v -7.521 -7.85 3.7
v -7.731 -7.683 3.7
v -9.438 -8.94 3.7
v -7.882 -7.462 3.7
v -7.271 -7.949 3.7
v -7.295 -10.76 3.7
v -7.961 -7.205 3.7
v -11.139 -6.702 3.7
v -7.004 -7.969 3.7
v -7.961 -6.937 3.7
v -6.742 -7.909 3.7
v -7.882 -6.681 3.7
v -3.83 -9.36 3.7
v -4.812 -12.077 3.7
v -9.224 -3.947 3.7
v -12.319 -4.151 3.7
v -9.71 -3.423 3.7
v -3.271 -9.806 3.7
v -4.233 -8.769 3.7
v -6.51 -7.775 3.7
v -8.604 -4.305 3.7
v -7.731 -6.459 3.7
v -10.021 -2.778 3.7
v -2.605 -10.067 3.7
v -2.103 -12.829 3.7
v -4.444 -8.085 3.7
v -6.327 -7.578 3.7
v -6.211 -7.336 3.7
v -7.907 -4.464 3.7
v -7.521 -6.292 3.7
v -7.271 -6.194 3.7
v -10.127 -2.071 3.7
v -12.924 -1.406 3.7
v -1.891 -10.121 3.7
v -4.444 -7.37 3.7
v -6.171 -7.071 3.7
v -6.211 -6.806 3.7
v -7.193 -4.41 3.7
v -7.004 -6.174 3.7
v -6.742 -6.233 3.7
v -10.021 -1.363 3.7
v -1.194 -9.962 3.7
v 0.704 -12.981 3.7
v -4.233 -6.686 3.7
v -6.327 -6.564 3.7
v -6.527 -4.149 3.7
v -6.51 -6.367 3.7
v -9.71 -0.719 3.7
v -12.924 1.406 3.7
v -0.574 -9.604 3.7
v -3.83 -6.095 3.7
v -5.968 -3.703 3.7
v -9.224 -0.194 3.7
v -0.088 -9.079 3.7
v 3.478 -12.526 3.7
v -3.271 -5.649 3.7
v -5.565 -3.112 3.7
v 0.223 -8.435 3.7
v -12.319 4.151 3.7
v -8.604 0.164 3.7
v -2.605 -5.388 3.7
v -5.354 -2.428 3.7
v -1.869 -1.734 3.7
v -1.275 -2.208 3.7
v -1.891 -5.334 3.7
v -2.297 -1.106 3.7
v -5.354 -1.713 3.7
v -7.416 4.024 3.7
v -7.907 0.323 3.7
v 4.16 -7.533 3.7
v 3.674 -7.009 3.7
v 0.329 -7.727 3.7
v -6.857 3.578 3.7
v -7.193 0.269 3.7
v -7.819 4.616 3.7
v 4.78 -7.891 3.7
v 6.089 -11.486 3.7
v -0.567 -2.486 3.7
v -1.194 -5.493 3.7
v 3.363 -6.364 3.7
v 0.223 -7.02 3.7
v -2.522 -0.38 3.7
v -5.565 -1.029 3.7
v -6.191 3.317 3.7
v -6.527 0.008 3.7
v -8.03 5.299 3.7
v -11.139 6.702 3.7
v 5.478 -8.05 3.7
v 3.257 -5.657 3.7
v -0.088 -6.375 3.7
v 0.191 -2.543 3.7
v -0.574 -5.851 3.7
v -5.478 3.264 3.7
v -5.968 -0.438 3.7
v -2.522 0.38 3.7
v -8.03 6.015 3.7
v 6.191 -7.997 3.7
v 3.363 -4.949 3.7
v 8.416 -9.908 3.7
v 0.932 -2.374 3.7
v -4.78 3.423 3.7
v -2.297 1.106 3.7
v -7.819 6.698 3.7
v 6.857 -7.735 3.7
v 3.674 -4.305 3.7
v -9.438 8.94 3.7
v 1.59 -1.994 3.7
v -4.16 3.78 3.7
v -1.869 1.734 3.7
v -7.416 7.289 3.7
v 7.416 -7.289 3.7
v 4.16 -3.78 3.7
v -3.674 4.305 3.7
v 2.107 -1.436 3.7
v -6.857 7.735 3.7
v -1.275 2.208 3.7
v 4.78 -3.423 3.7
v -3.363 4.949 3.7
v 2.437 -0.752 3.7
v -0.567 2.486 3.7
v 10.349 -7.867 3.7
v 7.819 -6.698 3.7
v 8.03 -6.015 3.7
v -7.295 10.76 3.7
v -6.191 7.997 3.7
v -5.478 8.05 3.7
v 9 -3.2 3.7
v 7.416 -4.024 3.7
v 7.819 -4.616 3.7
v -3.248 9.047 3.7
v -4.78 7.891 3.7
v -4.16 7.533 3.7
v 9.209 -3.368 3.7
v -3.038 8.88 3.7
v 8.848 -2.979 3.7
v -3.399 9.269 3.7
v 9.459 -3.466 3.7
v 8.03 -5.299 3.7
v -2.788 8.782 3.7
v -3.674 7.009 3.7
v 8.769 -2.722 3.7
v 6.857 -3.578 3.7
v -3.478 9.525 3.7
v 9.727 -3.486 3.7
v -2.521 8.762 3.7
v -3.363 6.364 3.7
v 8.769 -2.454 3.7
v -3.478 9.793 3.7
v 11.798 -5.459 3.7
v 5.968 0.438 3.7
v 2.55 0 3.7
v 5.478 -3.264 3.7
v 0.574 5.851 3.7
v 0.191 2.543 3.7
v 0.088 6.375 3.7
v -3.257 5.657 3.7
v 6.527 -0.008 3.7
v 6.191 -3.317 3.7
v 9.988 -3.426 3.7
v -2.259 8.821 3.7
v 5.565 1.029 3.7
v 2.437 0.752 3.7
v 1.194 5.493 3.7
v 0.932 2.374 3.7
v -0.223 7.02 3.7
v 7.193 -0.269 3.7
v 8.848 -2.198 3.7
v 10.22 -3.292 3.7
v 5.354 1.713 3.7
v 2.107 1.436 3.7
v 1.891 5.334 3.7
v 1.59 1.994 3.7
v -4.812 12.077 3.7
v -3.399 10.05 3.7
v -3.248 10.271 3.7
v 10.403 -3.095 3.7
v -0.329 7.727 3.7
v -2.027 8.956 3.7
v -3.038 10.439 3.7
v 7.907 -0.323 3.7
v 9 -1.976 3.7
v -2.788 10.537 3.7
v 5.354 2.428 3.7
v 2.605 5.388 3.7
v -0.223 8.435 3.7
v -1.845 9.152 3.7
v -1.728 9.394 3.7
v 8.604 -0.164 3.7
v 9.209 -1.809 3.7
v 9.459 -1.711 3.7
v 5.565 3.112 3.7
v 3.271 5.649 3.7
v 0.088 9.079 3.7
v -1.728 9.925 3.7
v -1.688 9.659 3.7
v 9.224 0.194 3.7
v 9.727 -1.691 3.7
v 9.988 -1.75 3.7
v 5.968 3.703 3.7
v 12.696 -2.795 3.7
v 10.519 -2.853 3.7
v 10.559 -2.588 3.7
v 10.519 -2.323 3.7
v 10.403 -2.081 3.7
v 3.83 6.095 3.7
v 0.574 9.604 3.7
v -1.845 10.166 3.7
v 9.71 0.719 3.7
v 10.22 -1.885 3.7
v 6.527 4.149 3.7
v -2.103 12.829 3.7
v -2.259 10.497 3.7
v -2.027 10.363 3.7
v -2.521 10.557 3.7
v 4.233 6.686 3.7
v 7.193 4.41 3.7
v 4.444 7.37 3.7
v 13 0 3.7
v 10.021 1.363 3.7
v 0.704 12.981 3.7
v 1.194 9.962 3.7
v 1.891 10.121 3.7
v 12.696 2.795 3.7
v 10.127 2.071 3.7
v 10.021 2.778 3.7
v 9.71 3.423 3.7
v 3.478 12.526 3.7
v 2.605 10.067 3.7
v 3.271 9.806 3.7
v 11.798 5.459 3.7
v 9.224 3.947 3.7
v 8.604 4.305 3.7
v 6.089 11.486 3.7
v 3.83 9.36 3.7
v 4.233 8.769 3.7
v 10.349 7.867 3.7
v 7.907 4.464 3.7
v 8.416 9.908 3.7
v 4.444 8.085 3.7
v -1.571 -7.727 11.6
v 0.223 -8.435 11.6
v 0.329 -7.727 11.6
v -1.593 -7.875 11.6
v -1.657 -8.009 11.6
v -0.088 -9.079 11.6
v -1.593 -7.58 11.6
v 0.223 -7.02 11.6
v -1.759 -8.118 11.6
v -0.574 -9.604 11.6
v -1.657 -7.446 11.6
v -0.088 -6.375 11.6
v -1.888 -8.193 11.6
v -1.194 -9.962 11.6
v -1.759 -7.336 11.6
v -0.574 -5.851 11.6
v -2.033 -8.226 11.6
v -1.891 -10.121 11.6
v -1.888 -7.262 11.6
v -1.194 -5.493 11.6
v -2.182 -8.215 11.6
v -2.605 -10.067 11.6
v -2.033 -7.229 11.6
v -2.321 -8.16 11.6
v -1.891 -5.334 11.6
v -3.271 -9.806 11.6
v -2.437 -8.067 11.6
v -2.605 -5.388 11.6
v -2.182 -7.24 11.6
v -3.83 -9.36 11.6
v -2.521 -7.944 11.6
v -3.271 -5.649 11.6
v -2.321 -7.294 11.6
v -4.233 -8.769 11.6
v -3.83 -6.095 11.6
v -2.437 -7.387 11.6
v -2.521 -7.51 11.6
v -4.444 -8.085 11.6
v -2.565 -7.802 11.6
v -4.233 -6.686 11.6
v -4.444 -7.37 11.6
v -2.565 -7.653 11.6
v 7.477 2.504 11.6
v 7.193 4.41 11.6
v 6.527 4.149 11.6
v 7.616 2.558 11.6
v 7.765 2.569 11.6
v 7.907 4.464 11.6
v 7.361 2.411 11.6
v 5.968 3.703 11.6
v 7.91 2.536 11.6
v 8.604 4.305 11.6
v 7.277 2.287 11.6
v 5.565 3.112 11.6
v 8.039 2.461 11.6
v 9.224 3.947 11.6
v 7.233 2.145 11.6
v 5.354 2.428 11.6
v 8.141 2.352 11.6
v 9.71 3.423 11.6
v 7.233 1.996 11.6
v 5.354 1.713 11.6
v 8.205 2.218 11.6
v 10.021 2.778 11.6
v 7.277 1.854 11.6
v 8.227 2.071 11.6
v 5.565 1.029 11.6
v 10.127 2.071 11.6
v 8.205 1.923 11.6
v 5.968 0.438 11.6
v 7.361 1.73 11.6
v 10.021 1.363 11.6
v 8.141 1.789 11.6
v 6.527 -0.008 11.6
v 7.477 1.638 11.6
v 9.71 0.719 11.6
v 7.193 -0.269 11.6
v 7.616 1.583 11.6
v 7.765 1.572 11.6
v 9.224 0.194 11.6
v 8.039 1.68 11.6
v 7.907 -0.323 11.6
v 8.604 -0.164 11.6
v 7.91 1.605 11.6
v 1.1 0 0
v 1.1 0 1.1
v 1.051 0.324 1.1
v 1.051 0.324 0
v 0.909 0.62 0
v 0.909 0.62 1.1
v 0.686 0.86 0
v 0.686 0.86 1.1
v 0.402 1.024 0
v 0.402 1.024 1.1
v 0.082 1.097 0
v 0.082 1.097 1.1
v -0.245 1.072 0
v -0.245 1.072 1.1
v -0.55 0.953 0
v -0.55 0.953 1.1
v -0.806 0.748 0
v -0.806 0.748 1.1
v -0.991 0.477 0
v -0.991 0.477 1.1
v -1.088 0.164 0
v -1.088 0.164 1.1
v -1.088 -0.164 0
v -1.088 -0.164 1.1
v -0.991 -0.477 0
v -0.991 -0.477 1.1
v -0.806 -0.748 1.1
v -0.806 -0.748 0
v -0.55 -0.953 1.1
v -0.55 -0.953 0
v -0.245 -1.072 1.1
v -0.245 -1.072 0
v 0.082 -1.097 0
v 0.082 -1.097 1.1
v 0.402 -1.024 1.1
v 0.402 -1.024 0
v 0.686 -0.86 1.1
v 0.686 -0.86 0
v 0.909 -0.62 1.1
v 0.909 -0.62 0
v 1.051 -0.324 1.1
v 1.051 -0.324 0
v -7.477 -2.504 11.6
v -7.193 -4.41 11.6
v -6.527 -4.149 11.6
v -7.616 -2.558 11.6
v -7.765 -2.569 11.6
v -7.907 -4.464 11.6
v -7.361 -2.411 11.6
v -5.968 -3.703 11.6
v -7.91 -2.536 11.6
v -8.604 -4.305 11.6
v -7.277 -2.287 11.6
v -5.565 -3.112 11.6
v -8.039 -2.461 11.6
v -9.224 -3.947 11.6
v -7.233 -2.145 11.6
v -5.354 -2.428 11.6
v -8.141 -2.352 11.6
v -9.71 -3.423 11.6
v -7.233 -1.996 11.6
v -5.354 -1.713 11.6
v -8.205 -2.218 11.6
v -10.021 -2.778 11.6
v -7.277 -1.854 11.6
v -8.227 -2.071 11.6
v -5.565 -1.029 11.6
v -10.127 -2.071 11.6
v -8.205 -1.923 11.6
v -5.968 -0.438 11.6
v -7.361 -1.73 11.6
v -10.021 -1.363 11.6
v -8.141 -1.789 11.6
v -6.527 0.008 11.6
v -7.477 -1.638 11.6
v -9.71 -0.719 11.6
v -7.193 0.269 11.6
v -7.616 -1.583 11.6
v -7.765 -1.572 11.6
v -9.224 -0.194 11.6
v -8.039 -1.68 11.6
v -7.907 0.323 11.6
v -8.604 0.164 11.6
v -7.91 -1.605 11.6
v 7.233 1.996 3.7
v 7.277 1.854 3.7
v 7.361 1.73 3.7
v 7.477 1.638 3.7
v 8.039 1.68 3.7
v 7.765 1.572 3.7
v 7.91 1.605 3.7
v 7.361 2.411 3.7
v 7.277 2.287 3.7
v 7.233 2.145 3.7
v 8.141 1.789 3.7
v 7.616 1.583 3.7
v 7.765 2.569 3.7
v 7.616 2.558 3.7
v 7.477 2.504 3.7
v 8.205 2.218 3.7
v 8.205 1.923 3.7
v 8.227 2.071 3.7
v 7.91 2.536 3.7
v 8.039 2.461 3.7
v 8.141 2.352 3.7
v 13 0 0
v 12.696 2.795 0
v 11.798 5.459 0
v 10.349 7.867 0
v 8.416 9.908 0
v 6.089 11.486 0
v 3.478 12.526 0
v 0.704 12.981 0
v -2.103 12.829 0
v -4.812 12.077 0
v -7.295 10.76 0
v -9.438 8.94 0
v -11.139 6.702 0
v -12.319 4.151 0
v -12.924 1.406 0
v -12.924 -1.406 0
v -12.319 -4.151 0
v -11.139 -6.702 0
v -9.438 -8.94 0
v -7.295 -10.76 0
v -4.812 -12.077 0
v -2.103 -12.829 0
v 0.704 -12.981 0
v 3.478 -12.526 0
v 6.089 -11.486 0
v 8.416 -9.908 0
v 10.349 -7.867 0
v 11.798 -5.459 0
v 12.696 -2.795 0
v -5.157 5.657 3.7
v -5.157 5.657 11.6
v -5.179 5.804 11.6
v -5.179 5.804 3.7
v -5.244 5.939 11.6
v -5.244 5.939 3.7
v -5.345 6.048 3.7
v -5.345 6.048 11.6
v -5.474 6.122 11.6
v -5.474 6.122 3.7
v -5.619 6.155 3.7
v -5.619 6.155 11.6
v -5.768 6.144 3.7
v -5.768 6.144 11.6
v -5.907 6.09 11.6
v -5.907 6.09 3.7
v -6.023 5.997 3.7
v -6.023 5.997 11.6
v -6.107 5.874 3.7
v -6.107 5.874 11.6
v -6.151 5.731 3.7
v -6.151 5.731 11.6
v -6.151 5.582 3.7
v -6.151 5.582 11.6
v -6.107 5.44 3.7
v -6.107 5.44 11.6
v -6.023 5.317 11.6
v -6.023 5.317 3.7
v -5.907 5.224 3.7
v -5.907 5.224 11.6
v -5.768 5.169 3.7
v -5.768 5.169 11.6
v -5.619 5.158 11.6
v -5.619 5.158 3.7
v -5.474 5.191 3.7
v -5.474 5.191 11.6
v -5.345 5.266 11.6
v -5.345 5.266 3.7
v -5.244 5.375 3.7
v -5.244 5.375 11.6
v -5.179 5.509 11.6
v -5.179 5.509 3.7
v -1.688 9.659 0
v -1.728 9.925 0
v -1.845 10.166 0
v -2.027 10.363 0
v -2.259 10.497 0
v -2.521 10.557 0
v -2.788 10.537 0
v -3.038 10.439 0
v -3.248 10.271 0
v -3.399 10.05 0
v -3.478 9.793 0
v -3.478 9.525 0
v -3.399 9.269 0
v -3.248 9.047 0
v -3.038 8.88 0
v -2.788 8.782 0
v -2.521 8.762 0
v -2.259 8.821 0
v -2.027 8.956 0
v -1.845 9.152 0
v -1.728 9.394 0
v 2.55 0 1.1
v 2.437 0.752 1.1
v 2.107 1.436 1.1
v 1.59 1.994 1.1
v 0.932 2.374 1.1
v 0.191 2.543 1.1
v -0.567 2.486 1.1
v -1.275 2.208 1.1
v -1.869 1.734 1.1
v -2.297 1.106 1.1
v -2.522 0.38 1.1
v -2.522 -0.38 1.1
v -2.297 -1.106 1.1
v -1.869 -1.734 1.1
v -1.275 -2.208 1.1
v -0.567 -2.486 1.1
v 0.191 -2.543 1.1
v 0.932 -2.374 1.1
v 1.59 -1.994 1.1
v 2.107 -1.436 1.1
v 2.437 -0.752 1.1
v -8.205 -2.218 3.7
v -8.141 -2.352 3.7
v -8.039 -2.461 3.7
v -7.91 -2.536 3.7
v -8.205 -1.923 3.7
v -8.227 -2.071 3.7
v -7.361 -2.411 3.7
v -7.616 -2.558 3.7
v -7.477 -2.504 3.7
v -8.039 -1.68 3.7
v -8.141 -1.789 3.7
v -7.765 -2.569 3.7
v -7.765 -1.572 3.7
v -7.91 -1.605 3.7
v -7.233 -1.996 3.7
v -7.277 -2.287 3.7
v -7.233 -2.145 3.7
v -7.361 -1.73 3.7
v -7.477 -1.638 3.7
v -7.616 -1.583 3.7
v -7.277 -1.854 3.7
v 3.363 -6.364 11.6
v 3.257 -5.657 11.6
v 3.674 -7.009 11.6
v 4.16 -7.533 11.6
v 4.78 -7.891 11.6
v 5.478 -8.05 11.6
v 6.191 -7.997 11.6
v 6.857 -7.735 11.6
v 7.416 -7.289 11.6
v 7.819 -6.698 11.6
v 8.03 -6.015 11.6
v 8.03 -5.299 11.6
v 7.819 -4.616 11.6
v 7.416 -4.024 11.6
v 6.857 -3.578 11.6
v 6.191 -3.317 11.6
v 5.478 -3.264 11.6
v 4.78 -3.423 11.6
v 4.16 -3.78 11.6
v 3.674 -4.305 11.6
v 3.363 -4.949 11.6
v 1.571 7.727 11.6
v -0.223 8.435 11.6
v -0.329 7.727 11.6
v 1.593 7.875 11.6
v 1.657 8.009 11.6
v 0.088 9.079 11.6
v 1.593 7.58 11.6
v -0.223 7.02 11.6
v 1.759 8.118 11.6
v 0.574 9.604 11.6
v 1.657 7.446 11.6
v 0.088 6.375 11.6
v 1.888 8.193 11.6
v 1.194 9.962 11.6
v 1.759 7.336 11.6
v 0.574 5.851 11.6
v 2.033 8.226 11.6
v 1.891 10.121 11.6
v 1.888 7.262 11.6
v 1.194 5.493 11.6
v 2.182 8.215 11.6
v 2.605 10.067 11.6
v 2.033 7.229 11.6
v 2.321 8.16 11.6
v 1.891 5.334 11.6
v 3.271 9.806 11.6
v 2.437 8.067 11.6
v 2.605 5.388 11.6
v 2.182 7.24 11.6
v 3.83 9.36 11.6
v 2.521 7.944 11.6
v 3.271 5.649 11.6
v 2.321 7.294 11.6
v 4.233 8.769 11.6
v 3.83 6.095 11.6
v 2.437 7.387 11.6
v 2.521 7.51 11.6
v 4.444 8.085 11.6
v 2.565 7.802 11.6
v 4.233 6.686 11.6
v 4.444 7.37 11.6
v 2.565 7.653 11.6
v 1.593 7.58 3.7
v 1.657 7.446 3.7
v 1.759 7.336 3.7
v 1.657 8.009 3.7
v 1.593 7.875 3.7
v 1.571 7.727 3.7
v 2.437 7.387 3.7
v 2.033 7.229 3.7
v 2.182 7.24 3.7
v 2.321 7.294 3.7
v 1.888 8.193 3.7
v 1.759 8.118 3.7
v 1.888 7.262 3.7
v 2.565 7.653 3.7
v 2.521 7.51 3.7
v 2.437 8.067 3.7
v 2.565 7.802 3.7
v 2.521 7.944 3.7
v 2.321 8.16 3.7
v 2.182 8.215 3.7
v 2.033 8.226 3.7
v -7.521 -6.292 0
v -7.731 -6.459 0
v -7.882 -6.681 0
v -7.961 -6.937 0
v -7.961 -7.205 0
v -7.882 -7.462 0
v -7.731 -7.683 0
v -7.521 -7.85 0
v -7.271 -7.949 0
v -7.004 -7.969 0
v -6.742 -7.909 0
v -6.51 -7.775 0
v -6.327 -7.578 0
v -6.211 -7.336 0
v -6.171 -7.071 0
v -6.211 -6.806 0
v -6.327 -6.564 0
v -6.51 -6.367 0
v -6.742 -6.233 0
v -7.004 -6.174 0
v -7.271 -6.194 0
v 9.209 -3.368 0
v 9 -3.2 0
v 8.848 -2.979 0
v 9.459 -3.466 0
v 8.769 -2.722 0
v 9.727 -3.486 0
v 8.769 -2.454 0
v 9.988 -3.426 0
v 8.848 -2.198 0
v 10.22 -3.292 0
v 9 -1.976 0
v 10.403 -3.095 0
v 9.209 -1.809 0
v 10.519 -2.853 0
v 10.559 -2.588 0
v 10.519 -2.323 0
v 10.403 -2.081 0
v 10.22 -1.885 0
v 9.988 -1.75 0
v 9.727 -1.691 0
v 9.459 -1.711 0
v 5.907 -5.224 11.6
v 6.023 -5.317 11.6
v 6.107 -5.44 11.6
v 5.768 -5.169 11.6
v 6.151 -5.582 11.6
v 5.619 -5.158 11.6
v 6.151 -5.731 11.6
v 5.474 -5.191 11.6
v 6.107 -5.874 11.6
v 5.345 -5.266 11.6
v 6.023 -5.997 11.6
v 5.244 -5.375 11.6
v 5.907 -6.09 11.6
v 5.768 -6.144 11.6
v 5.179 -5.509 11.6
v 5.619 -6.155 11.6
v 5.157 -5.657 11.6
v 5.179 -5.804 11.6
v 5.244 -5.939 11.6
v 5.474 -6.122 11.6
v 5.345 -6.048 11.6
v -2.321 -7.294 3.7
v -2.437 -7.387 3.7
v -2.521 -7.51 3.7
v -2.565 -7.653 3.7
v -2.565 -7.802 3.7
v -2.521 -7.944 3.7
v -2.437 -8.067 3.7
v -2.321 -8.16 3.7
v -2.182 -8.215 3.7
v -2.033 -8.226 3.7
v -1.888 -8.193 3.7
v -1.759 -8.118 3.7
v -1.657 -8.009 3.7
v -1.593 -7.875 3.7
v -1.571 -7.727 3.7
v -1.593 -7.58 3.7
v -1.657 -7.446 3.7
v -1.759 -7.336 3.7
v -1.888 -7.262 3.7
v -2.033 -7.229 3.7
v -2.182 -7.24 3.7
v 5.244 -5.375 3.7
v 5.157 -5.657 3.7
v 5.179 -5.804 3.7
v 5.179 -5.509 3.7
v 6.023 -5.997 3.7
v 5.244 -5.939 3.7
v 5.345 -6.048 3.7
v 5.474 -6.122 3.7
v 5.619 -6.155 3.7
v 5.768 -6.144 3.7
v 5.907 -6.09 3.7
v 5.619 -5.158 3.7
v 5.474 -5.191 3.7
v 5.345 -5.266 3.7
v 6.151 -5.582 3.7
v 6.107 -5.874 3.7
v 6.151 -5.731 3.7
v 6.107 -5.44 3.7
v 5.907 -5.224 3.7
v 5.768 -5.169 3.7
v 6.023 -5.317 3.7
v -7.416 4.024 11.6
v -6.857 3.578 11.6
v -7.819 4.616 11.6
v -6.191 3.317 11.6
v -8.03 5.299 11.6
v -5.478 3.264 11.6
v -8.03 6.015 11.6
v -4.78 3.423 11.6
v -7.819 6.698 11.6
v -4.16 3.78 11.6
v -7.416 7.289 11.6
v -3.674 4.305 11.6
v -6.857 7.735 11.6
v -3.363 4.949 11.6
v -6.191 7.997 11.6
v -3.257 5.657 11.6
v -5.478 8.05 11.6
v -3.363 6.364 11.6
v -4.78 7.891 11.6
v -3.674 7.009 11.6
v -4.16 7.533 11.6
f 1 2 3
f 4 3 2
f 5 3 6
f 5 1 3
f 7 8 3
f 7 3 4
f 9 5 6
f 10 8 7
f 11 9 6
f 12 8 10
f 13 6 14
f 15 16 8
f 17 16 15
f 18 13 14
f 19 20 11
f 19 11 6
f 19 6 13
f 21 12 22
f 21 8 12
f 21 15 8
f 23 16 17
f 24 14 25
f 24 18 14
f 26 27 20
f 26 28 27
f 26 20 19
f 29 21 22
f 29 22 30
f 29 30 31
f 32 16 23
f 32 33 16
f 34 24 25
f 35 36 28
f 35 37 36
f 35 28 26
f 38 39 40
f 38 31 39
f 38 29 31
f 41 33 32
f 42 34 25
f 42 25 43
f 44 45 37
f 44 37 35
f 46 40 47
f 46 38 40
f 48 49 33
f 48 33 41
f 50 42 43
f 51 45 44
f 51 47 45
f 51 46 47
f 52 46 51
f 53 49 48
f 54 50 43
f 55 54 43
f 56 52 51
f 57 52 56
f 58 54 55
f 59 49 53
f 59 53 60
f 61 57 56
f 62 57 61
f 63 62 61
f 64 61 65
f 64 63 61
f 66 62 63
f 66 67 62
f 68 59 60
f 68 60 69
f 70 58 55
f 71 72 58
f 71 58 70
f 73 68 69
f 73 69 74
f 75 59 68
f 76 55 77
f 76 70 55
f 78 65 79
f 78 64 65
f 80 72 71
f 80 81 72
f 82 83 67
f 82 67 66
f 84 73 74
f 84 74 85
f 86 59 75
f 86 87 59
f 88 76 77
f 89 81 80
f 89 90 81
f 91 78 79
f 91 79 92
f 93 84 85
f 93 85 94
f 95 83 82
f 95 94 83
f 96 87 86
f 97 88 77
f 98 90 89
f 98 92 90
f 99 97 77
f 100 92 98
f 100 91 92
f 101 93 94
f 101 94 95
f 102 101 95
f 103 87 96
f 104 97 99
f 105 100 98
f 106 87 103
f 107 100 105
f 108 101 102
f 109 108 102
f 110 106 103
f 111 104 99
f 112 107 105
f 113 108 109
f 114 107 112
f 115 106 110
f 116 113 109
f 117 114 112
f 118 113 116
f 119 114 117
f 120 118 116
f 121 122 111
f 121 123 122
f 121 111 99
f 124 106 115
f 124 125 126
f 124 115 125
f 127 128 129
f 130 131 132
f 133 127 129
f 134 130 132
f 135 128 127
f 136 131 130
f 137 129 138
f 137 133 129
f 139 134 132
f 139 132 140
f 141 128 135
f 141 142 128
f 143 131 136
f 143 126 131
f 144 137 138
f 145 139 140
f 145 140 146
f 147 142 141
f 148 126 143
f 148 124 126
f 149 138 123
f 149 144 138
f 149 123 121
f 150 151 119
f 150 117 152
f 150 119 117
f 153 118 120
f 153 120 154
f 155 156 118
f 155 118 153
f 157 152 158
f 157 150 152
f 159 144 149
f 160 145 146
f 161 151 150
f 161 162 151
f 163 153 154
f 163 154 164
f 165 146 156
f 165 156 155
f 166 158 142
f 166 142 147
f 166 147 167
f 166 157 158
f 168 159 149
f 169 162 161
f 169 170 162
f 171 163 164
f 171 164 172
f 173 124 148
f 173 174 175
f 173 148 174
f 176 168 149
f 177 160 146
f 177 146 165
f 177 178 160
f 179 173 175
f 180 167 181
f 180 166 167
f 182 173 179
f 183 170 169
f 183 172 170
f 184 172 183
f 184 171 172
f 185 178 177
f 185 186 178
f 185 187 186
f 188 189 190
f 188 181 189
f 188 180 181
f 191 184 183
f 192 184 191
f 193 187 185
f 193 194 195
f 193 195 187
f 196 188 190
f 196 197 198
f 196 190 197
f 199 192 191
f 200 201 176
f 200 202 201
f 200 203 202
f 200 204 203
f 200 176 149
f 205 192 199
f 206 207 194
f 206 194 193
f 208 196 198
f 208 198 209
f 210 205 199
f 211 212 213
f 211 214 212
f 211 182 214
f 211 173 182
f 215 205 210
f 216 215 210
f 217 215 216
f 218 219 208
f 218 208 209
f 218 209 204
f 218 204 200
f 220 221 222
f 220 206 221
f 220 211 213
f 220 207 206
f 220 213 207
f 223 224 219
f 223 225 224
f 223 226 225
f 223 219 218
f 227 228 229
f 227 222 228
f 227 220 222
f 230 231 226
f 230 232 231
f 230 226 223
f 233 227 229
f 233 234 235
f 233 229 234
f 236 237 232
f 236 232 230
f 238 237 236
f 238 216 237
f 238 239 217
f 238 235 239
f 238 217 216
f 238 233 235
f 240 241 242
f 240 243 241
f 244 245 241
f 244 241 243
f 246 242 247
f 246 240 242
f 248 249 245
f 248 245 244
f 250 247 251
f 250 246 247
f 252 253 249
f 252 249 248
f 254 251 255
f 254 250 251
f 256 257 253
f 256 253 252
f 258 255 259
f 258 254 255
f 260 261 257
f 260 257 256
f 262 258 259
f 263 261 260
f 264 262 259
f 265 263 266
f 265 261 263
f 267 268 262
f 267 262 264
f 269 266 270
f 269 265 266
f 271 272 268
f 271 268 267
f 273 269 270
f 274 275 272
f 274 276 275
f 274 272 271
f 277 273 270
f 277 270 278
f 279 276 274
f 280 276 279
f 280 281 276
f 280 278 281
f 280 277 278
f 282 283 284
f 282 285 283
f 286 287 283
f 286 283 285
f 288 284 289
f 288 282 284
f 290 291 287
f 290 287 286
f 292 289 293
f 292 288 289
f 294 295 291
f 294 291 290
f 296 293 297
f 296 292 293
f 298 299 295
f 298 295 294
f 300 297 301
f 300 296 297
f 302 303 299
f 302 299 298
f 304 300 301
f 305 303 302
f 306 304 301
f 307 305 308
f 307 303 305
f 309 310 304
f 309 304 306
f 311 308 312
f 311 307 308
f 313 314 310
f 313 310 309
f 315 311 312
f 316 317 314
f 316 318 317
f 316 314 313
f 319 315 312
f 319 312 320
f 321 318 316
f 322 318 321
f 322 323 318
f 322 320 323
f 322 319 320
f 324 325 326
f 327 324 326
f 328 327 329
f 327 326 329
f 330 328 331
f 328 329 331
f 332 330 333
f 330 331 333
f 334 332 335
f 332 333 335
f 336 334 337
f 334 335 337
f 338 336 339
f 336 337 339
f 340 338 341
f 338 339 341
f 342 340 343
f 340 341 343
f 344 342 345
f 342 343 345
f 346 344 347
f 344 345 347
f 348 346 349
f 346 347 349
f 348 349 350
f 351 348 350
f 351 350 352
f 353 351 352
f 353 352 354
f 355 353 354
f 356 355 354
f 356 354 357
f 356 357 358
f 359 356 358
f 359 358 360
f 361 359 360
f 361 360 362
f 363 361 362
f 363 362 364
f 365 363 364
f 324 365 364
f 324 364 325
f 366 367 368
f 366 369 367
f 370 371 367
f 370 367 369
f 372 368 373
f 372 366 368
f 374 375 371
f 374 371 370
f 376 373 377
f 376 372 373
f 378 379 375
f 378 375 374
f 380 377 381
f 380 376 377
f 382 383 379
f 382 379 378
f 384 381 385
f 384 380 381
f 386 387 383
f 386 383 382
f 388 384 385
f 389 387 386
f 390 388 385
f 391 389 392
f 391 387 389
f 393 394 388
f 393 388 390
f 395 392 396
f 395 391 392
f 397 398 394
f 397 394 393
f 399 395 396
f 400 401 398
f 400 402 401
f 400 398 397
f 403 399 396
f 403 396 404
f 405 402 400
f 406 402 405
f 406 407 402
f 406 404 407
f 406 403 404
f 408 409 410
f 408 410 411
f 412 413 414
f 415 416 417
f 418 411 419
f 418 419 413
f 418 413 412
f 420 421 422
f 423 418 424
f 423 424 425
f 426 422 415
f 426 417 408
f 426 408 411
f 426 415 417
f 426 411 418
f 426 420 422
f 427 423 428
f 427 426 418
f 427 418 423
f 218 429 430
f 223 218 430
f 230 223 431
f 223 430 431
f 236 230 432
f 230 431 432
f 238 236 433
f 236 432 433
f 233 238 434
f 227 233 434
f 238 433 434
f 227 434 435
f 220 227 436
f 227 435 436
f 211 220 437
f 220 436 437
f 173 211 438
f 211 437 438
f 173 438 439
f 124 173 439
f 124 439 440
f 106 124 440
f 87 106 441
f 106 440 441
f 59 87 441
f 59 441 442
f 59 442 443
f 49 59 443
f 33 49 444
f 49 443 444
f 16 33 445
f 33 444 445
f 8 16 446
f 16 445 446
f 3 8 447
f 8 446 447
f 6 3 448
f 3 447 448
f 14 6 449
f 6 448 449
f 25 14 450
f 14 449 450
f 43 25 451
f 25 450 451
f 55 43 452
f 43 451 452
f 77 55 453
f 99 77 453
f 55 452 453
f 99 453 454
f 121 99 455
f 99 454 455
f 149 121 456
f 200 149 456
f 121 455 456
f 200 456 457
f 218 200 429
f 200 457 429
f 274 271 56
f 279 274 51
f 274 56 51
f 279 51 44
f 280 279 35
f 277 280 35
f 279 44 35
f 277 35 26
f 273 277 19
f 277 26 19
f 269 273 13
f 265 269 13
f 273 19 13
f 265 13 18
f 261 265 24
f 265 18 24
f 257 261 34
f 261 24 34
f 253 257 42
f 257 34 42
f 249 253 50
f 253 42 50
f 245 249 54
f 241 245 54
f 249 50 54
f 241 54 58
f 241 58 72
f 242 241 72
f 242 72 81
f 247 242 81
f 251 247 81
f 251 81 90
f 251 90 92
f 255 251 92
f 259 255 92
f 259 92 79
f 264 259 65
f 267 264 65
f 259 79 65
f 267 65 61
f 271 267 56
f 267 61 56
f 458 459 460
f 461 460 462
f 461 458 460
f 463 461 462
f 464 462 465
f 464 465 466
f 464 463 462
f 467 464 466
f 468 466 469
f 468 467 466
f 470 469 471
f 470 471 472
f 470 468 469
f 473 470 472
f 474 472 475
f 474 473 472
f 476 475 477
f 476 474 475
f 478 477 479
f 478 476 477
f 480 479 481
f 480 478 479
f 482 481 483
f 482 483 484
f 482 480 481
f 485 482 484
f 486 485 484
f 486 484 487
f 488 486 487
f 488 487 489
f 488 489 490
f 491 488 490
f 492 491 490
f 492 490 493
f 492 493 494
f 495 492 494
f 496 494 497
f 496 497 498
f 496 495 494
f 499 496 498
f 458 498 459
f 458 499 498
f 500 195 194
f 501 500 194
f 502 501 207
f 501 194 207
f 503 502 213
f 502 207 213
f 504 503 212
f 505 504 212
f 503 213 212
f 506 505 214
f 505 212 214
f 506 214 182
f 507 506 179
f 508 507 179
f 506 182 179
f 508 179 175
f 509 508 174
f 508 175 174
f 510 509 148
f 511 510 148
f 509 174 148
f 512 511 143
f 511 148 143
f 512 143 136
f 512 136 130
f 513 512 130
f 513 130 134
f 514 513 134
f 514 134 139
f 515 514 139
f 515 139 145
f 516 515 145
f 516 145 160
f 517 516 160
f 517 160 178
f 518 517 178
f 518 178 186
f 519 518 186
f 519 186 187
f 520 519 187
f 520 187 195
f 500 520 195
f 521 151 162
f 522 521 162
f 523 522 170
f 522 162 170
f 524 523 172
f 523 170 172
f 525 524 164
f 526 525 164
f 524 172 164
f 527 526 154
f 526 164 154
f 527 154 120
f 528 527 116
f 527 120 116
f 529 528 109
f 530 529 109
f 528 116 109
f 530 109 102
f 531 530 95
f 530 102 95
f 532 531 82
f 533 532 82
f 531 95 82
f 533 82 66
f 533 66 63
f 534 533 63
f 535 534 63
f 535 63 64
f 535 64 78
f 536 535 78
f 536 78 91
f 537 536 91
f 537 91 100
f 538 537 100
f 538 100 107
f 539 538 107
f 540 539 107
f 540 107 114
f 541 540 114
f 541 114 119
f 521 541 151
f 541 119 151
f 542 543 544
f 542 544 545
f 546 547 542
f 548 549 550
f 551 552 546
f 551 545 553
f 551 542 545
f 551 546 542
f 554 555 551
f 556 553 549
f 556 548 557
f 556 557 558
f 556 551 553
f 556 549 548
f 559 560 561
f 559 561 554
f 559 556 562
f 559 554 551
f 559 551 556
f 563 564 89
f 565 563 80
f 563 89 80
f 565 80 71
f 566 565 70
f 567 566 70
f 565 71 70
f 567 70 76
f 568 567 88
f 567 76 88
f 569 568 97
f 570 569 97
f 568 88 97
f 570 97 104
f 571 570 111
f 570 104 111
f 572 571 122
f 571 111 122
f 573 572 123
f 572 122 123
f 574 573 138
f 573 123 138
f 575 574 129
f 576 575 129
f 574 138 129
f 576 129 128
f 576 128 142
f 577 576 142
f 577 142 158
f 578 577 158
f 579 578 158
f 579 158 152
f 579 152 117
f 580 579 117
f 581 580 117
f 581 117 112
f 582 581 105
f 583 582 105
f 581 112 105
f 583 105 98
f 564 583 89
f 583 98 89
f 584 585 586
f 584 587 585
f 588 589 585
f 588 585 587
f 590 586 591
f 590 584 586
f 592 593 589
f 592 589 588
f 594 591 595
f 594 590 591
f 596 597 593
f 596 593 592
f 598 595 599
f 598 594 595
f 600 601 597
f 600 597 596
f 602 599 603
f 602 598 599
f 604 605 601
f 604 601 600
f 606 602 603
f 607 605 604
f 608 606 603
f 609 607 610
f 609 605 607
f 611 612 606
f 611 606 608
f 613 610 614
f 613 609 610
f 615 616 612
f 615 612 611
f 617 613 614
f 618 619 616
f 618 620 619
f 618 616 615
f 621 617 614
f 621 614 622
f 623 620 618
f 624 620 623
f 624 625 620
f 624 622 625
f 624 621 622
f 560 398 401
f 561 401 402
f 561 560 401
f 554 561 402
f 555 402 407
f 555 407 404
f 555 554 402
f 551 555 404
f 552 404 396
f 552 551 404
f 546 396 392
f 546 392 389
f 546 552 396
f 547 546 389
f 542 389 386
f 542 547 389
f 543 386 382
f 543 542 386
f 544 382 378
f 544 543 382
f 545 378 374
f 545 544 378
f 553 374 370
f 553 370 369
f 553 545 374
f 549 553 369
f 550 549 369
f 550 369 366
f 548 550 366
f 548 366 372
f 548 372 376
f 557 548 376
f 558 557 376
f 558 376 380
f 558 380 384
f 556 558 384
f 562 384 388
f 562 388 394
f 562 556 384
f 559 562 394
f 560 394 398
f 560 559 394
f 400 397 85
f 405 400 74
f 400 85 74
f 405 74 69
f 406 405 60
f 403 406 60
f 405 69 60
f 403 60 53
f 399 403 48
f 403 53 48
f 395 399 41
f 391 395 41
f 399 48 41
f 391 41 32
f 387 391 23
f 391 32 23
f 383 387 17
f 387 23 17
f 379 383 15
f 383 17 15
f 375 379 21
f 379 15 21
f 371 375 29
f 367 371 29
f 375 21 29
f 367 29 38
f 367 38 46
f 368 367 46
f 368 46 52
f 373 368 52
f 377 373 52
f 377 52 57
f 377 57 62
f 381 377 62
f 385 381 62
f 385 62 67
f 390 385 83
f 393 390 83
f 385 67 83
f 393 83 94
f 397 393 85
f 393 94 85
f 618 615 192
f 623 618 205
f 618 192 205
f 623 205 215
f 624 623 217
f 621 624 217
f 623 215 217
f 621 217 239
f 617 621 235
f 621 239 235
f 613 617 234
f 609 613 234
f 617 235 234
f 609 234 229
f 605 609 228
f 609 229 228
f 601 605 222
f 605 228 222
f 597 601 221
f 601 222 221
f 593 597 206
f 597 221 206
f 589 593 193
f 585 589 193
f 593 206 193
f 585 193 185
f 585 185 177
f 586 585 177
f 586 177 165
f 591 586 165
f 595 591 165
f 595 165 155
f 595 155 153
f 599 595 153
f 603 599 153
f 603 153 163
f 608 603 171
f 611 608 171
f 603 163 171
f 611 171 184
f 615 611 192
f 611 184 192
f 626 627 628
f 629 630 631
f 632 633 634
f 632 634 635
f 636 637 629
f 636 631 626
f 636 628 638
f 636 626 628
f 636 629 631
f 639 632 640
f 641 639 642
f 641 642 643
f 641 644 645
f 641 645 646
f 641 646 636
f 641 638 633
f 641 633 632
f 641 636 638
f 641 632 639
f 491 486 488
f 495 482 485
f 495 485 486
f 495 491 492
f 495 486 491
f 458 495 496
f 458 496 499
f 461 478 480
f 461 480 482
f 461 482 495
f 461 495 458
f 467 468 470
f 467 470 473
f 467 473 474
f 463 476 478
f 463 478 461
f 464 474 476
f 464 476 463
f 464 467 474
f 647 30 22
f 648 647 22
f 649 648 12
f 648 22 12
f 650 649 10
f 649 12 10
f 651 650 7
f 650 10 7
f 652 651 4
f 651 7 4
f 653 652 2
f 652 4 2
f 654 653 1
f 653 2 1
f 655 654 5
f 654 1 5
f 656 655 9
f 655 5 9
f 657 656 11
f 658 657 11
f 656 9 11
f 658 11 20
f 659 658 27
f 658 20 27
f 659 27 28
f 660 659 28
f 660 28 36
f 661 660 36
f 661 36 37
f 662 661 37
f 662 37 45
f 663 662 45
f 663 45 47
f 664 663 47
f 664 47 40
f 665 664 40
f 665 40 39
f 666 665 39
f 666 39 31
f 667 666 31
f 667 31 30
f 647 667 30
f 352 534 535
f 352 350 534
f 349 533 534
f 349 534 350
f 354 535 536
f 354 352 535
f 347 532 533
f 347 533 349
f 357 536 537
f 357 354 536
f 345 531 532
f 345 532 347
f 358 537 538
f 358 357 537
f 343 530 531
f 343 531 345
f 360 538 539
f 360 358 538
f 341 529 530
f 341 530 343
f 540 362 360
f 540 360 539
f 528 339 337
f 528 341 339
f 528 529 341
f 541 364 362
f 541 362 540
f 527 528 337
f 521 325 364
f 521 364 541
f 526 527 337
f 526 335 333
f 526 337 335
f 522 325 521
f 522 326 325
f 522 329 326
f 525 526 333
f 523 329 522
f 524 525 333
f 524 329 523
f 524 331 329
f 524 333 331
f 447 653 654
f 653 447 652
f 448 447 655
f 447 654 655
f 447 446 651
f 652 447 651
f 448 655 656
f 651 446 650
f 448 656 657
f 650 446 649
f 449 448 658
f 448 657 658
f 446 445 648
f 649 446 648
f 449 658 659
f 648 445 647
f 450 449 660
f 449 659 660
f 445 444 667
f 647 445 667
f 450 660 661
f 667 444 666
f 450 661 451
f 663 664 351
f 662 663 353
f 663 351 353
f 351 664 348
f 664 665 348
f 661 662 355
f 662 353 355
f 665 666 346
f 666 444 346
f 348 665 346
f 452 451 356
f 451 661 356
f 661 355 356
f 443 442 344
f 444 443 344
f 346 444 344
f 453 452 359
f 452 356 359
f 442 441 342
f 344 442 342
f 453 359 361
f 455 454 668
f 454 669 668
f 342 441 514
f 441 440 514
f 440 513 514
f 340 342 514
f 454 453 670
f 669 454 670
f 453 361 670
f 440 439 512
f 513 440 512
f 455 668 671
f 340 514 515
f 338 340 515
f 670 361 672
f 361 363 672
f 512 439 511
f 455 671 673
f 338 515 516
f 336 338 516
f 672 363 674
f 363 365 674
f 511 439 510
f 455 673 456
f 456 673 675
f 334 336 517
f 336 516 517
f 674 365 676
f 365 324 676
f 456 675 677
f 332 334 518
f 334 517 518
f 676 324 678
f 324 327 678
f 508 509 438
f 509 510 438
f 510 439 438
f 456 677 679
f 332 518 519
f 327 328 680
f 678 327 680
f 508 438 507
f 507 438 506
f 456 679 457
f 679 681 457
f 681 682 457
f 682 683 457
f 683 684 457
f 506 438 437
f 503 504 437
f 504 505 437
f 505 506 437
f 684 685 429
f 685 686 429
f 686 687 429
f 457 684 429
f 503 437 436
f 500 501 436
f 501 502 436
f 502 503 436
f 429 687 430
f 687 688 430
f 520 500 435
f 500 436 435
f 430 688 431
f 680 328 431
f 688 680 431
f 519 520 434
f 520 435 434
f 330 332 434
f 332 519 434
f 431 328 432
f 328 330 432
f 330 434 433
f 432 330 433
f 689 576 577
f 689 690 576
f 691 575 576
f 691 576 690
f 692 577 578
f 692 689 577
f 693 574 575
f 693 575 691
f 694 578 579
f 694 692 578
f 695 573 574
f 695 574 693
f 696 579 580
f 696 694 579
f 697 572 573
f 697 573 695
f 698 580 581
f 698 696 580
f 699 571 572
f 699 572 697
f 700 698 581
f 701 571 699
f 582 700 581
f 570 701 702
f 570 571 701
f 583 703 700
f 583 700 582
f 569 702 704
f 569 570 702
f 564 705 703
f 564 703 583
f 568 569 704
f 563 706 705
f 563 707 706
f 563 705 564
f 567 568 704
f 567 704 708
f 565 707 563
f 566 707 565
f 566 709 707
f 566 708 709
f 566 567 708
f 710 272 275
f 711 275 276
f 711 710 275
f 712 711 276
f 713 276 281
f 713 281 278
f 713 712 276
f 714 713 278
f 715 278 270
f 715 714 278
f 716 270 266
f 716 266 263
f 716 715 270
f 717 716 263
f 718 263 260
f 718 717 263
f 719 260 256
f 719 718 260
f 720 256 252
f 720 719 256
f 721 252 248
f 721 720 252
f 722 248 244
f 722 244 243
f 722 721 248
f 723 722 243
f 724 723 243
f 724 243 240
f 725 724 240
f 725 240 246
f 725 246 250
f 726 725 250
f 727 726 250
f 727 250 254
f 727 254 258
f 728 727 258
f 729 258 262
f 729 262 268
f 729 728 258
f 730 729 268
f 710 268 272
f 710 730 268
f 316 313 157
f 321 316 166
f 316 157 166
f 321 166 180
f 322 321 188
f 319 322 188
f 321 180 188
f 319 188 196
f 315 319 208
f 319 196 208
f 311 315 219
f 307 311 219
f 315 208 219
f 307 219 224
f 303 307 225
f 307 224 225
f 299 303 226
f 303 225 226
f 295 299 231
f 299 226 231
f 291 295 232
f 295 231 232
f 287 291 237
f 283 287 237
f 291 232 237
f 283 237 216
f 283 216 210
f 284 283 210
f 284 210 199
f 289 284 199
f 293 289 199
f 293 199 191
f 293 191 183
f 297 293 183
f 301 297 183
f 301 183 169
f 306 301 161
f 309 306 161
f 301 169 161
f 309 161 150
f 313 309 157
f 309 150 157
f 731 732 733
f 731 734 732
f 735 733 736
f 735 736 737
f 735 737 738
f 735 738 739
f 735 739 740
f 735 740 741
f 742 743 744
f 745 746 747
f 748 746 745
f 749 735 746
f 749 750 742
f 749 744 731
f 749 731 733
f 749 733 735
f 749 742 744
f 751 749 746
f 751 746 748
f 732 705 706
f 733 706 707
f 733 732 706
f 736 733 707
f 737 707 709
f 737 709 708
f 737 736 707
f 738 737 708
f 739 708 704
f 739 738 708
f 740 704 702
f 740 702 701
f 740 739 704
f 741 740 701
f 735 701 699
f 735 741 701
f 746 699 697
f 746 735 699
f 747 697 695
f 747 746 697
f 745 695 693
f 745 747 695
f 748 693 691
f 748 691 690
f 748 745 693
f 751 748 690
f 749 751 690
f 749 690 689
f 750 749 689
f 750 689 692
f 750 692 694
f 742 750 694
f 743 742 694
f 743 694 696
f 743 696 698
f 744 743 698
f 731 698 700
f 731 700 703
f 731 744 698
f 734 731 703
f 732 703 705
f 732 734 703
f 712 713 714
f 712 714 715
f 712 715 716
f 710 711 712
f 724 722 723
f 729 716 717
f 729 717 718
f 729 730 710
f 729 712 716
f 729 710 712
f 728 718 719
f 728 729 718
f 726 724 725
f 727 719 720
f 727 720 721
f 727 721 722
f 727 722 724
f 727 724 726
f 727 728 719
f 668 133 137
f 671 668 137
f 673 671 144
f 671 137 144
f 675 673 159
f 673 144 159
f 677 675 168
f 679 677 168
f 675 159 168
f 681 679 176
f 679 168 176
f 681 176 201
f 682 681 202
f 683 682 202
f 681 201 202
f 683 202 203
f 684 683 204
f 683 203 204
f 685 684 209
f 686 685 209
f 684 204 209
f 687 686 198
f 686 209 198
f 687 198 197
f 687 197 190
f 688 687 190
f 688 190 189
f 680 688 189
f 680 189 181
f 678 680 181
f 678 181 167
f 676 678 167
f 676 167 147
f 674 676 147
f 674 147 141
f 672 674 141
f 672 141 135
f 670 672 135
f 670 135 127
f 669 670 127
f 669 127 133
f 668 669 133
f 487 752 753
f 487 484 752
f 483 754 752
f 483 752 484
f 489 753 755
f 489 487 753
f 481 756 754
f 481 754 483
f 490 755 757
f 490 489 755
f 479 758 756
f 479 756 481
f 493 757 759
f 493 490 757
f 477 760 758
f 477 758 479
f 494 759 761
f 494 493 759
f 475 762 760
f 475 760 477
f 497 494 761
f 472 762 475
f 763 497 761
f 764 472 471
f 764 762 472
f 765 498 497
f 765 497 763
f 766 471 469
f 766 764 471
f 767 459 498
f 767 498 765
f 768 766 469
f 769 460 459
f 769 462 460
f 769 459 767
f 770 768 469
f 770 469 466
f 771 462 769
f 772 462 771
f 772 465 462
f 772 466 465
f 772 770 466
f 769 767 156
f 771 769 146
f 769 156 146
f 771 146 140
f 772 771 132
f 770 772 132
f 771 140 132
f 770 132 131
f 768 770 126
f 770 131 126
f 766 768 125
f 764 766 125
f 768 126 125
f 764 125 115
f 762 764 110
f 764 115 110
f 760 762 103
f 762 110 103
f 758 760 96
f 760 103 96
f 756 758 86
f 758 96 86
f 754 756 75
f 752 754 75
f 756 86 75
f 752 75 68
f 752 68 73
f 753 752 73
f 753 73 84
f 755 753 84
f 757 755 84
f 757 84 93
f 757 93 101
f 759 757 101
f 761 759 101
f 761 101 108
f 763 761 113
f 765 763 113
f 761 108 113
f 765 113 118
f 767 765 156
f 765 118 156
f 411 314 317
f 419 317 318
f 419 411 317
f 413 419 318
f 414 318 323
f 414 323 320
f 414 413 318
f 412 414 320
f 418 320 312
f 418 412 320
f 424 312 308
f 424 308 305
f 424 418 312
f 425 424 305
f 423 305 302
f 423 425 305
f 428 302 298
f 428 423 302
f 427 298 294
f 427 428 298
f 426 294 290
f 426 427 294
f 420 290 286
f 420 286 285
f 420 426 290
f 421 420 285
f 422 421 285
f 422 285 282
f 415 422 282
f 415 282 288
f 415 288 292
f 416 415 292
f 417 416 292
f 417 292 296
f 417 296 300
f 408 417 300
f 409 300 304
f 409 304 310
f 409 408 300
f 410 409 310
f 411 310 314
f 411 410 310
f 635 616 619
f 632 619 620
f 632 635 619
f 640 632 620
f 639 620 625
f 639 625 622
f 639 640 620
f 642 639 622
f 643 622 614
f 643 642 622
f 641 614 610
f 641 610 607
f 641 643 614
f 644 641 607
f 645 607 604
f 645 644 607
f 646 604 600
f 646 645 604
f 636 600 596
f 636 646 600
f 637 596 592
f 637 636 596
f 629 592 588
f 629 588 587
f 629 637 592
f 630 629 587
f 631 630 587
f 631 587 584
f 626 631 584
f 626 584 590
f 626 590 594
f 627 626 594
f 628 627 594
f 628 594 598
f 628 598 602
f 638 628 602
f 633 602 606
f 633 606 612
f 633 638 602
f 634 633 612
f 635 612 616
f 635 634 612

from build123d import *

# Parameters (mm, degrees)
SKETCH_1_R               = 13
EXTRUDE_1_DEPTH          = 3.7
SKETCH_3_R               = 2.4
SKETCH_3_R_2             = 0.5
EXTRUDE_3_DEPTH          = 7.9
PATTERN_CIRCULAR_1_COUNT = 6
SKETCH_4_R               = 0.9
CUT_EXTRUDE_1_DEPTH      = 21.010247375
PATTERN_CIRCULAR_2_COUNT = 3
SKETCH_5_R               = 1.1
CUT_EXTRUDE_2_DEPTH      = 21.010247375
SKETCH_5_4_R             = 2.55
SKETCH_5_4_R_2           = 1.1
CUT_EXTRUDE_3_DEPTH      = 2.6


with BuildPart() as part:
    # 草图1 → 凸台-拉伸1 (new body)
    with BuildSketch(Plane.XY):
        Circle(SKETCH_1_R)
    extrude(amount=EXTRUDE_1_DEPTH)

    # 草图3 → 凸台-拉伸3 (add)
    with BuildSketch(Plane.XY.offset(3.7)):
        with Locations((-5.656854249, 5.656854249)):
            Circle(SKETCH_3_R)
        with Locations((-5.656854249, 5.656854249)):
            Circle(SKETCH_3_R_2, mode=Mode.SUBTRACT)
    extrude_3 = extrude(amount=EXTRUDE_3_DEPTH)

    # 阵列(圆周)1: 凸台-拉伸3 ×6 about axis
    pattern_circular_1_axis = Axis((0, 0, 3.7), (0, 0, -1))
    for i in range(1, PATTERN_CIRCULAR_1_COUNT):
        add(extrude_3.rotate(pattern_circular_1_axis, i * 360 / PATTERN_CIRCULAR_1_COUNT))

    # 草图4 → 切除-拉伸1 (cut, through all)
    with BuildSketch(Plane.XY.offset(3.7)):
        with Locations((-2.588190451, 9.659258263)):
            Circle(SKETCH_4_R)
    cut_extrude_1 = extrude(amount=-CUT_EXTRUDE_1_DEPTH, mode=Mode.SUBTRACT)

    # 阵列(圆周)2: 切除-拉伸1 ×3 about axis
    pattern_circular_2_axis = Axis((0, 0, 3.7), (0, 0, -1))
    for i in range(1, PATTERN_CIRCULAR_2_COUNT):
        add(cut_extrude_1.rotate(pattern_circular_2_axis, i * 360 / PATTERN_CIRCULAR_2_COUNT), mode=Mode.SUBTRACT)

    # 草图5 → 切除-拉伸2 (cut, through all)
    with BuildSketch(Plane.XY.offset(3.7)):
        Circle(SKETCH_5_R)
    extrude(amount=-CUT_EXTRUDE_2_DEPTH, mode=Mode.SUBTRACT)

    # 草图5<4> → 切除-拉伸3 (cut)
    with BuildSketch(Plane.XY.offset(3.7)):
        Circle(SKETCH_5_4_R)
        Circle(SKETCH_5_4_R_2, mode=Mode.SUBTRACT)
    extrude(amount=-CUT_EXTRUDE_3_DEPTH, mode=Mode.SUBTRACT)


solid = part.part
